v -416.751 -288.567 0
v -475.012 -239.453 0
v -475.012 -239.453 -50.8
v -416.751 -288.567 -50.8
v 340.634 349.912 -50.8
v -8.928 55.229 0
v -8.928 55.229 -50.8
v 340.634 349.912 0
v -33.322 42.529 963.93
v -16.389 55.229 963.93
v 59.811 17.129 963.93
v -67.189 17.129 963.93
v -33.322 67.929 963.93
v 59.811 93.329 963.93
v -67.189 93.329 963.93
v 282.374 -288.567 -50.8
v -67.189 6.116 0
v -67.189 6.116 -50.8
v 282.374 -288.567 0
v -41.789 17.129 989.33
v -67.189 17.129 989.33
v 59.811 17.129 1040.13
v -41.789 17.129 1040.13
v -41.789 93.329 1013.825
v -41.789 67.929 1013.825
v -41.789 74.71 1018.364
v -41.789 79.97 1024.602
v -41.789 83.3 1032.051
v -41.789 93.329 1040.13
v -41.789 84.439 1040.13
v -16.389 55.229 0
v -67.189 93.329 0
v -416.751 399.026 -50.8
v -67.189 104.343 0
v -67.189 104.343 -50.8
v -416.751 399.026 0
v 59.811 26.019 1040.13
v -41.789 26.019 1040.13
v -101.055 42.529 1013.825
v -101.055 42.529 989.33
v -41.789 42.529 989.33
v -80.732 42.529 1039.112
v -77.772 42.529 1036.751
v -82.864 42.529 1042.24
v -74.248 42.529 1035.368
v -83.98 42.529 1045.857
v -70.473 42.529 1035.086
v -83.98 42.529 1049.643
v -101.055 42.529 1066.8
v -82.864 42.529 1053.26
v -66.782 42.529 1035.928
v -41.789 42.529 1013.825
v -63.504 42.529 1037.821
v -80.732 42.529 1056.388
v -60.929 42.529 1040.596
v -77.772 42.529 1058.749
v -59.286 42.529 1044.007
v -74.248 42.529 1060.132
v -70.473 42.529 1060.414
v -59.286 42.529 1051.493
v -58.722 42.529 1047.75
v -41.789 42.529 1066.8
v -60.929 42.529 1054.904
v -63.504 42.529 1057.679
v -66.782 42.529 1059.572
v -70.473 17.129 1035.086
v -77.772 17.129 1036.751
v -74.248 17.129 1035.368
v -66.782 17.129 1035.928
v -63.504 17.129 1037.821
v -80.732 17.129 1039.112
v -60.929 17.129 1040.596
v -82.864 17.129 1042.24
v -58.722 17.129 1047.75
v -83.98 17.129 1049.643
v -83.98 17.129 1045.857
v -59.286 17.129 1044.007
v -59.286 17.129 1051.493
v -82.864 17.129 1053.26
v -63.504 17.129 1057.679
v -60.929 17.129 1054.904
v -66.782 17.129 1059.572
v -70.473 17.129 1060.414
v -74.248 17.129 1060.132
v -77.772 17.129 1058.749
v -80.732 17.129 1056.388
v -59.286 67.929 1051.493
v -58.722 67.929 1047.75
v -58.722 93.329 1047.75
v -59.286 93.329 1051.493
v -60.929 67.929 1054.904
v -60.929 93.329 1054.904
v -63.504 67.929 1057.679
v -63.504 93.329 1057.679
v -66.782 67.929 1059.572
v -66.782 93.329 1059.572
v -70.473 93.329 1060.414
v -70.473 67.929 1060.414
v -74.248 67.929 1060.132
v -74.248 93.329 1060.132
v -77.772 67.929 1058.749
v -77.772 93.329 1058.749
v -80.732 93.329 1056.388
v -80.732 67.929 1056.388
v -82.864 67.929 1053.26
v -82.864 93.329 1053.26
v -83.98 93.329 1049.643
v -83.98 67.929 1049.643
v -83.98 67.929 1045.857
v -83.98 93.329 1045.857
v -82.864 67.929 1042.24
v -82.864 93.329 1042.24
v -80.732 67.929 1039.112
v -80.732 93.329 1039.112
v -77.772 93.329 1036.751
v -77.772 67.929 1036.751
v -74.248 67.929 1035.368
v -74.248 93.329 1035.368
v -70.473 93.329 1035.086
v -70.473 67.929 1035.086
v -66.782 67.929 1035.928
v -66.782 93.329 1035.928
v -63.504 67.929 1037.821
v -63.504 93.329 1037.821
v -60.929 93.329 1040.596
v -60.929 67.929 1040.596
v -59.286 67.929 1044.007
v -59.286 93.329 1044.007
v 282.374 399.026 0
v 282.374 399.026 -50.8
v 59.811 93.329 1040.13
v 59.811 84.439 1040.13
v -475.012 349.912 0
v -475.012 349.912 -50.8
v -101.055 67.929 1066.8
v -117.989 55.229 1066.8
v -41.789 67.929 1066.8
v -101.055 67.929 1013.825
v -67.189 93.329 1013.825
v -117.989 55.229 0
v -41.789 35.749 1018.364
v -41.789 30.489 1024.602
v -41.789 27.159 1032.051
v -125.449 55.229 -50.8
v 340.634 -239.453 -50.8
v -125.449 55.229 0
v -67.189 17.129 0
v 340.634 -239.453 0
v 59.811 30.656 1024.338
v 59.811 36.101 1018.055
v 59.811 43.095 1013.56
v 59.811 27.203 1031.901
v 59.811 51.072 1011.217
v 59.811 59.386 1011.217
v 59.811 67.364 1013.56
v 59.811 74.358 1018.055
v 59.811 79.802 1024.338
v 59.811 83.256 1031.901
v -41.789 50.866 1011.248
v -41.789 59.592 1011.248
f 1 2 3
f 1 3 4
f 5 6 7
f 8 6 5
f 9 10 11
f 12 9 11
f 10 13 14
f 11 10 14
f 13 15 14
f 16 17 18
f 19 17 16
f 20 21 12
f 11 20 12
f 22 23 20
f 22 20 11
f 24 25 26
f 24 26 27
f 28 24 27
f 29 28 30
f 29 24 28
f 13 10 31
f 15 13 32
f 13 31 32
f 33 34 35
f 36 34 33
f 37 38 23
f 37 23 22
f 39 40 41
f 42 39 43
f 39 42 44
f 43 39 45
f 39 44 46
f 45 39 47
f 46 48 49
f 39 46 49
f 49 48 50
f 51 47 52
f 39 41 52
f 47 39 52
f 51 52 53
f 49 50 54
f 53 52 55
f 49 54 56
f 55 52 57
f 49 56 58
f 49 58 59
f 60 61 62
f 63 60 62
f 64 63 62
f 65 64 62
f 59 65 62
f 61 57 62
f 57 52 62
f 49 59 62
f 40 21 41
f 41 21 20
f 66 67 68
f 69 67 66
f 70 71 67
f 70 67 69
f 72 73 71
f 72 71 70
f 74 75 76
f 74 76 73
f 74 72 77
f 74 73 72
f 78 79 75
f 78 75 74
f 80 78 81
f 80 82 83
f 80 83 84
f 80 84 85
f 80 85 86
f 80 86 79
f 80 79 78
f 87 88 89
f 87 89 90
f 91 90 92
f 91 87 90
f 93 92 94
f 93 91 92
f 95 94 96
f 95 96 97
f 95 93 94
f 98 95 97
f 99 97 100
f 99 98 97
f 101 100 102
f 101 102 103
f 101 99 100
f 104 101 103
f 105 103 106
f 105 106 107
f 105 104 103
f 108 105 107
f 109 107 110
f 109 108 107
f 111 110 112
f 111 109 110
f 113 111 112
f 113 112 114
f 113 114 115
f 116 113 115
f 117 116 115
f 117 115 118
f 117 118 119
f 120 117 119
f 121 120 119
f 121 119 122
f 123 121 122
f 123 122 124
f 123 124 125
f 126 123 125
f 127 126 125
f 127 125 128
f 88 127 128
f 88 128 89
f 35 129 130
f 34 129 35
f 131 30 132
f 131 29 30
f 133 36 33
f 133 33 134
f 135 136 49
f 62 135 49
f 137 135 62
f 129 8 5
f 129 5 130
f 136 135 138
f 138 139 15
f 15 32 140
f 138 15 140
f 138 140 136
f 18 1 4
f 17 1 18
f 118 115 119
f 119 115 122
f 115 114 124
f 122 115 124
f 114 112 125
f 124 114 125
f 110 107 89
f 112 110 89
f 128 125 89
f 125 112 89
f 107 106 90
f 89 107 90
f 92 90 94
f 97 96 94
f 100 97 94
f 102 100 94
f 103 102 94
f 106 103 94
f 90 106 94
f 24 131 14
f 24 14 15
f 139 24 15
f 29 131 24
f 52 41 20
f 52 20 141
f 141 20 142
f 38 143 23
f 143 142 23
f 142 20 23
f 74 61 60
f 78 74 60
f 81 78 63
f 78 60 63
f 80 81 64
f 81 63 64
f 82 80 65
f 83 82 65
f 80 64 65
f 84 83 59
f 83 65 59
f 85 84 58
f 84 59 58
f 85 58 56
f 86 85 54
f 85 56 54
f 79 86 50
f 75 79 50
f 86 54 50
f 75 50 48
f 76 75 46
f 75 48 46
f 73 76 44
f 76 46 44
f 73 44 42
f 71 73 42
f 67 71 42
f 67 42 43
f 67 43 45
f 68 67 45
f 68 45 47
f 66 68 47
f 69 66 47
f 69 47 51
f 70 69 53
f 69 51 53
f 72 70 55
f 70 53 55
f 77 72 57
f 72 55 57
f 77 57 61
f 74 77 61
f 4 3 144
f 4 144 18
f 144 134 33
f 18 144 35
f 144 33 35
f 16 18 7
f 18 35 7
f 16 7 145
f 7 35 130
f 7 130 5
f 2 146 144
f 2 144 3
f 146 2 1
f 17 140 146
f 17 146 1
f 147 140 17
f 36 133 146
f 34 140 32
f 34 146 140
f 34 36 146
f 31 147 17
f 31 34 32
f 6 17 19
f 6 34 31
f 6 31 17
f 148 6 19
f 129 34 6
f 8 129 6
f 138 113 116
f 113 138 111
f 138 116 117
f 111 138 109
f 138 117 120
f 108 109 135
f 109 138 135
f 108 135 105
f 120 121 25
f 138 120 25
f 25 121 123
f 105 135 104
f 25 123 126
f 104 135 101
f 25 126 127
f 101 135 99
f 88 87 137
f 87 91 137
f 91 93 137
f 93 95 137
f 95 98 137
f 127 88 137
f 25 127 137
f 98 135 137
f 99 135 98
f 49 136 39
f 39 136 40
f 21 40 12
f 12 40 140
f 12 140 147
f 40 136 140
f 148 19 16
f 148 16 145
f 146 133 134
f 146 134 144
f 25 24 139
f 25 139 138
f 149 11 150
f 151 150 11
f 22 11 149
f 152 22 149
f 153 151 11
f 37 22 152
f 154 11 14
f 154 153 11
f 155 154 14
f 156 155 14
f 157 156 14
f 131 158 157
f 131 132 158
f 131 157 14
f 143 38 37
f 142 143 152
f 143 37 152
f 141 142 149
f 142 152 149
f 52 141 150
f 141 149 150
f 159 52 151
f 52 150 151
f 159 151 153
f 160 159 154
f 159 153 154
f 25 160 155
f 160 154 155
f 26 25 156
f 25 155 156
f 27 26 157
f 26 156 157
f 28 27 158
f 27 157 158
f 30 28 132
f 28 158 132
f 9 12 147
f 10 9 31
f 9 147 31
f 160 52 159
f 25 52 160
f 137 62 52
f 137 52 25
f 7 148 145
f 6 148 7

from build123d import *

# Parameters (mm, degrees)
F1_DEPTH       = 50.8
F3_DEPTH       = 1066.8
F5_DEPTH       = 26.67
F7_DEPTH       = 76.2
F8_R           = 29.21
F9_DEPTH       = 101.6
F11_DEPTH      = 0.366359725
F13_DEPTH      = 59.2676666667
F14_W          = 33.8666666667
F14_H          = 50.8
F14_W_2        = 25.4
F15_DEPTH      = 25.4
F16_W          = 33.8666666667
F16_H          = 26.3046402751
F16_W_2        = 25.4
F17_DEPTH      = 25.4
F18_R          = 12.7
F19_DEPTH      = 25.4
F19_DEPTH_BACK = 50.8


# Not quite as in the source:
# - a feature names something its author has since deleted; it is built from what else it names


with BuildPart() as f1:
    # F0 (on Top) → F1 (new body)
    with BuildSketch(Plane.XY):
        Polygon((-67.1887439802, 6.1155312845), (282.3736590158, -288.5672921234), (340.6340595151, -239.4534882221), (-8.9283434809, 55.2293351858), (340.6340595151, 349.9121585937), (282.3736590158, 399.025962495), (-67.1887439802, 104.3431390871), (-416.7511469763, 399.025962495), (-475.0115474756, 349.9121585937), (-125.4491444796, 55.2293351858), (-475.0115474756, -239.4534882221), (-416.7511469763, -288.5672921234), align=None)
    extrude(amount=-F1_DEPTH)

    # F2 (on face) → F3 (join)
    with BuildSketch(Plane.XY):
        Polygon((-67.1887439802, 93.3293351858), (-117.9887439802, 55.2293351858), (-67.1887439802, 17.1293351858), (-16.3887439802, 55.2293351858), align=None)
    extrude(amount=F3_DEPTH)

    # F4 (on face) → F5 (cut)
    with BuildSketch(Plane.XY.offset(1066.8)):
        Polygon((-67.1887439802, 17.1293351858), (-33.3220773136, 42.5293351858), (-101.0554106469, 42.5293351858), align=None)
        Polygon((-101.0554106469, 67.9293351858), (-33.3220773136, 67.9293351858), (-67.1887439802, 93.3293351858), align=None)
    extrude(amount=-F5_DEPTH, mode=Mode.SUBTRACT)

    # F6 (on face) → F7 (join)
    with BuildSketch(Plane.XY.offset(1040.13)):
        Polygon((59.8112560198, 93.3293351858), (-67.1887439802, 93.3293351858), (-33.3220773136, 67.9293351858), (-16.3887439802, 55.2293351858), (-33.3220773136, 42.5293351858), (-67.1887439802, 17.1293351858), (59.8112560198, 17.1293351858), align=None)
    extrude(amount=-F7_DEPTH)

    # F8 (on face) → F9 (cut)
    with BuildSketch(Plane.YZ.offset(59.8112560198)):
        with Locations((55.2293351858, 1040.13)):
            Circle(F8_R)
    extrude(amount=-F9_DEPTH, mode=Mode.SUBTRACT)

    # F10 (on face) → F11 (cut, through all)
    with BuildSketch(Plane.XY.offset(1066.8)):
        Polygon((-33.3220773136, 67.9293351858), (-41.7887439802, 67.9293351858), (-41.7887439802, 67.1429912157), (-32.2736186868, 67.1429912157), align=None)
        Polygon((-32.2736186868, 43.3156791558), (-41.7887439802, 43.3156791558), (-41.7887439802, 42.5293351858), (-33.3220773136, 42.5293351858), align=None)
    extrude(amount=-F11_DEPTH, mode=Mode.SUBTRACT)

    # F12 (on face) → F13 (cut, through all)
    with BuildSketch(Plane.YZ.offset(-41.7887439802)):
        with BuildLine():
            Line((42.5293351858, 1040.13), (26.0193351858, 1040.13))
            ThreePointArc((26.0193351858, 1040.13), (30.4887703175, 1024.601685539), (42.5293351858, 1013.8253597249))
            Line((42.5293351858, 1013.8253597249), (42.5293351858, 1040.13))
        make_face()
        with BuildLine():
            Line((84.4393351858, 1040.13), (67.9293351858, 1040.13))
            Line((67.9293351858, 1040.13), (67.9293351858, 1013.8253597249))
            ThreePointArc((67.9293351858, 1013.8253597249), (79.969900054, 1024.601685539), (84.4393351858, 1040.13))
        make_face()
    extrude(amount=-F13_DEPTH, mode=Mode.SUBTRACT)

    # F14 (on face) → F15 (cut)
    with BuildSketch(Plane.XZ.offset(-17.1293351858)):
        with Locations((-84.1220773136, 1014.73)):
            Rectangle(F14_W, F14_H)
        with Locations((-54.4887439802, 1014.73)):
            Rectangle(F14_W_2, F14_H)
    extrude(amount=-F15_DEPTH, mode=Mode.SUBTRACT)

    # F16 (on face) → F17 (cut)
    with BuildSketch(Plane(origin=(0, 93.3293351858, 0), x_dir=(-1, 0, 0), z_dir=(0, 1, 0))):
        with Locations((84.1220773136, 1026.9776798625)):
            Rectangle(F16_W, F16_H)
        with Locations((54.4887439802, 1026.9776798625)):
            Rectangle(F16_W_2, F16_H)
    extrude(amount=-F17_DEPTH, mode=Mode.SUBTRACT)

    # F18 (on face) → F19 (join, two sides)
    with BuildSketch(Plane.XZ.offset(-42.5293351858)) as f19_sk:
        with Locations((-71.4220773136, 1047.75)):
            Circle(F18_R)
    extrude(amount=F19_DEPTH)
    extrude(f19_sk.sketch, amount=-F19_DEPTH_BACK)


solid = f1.part
